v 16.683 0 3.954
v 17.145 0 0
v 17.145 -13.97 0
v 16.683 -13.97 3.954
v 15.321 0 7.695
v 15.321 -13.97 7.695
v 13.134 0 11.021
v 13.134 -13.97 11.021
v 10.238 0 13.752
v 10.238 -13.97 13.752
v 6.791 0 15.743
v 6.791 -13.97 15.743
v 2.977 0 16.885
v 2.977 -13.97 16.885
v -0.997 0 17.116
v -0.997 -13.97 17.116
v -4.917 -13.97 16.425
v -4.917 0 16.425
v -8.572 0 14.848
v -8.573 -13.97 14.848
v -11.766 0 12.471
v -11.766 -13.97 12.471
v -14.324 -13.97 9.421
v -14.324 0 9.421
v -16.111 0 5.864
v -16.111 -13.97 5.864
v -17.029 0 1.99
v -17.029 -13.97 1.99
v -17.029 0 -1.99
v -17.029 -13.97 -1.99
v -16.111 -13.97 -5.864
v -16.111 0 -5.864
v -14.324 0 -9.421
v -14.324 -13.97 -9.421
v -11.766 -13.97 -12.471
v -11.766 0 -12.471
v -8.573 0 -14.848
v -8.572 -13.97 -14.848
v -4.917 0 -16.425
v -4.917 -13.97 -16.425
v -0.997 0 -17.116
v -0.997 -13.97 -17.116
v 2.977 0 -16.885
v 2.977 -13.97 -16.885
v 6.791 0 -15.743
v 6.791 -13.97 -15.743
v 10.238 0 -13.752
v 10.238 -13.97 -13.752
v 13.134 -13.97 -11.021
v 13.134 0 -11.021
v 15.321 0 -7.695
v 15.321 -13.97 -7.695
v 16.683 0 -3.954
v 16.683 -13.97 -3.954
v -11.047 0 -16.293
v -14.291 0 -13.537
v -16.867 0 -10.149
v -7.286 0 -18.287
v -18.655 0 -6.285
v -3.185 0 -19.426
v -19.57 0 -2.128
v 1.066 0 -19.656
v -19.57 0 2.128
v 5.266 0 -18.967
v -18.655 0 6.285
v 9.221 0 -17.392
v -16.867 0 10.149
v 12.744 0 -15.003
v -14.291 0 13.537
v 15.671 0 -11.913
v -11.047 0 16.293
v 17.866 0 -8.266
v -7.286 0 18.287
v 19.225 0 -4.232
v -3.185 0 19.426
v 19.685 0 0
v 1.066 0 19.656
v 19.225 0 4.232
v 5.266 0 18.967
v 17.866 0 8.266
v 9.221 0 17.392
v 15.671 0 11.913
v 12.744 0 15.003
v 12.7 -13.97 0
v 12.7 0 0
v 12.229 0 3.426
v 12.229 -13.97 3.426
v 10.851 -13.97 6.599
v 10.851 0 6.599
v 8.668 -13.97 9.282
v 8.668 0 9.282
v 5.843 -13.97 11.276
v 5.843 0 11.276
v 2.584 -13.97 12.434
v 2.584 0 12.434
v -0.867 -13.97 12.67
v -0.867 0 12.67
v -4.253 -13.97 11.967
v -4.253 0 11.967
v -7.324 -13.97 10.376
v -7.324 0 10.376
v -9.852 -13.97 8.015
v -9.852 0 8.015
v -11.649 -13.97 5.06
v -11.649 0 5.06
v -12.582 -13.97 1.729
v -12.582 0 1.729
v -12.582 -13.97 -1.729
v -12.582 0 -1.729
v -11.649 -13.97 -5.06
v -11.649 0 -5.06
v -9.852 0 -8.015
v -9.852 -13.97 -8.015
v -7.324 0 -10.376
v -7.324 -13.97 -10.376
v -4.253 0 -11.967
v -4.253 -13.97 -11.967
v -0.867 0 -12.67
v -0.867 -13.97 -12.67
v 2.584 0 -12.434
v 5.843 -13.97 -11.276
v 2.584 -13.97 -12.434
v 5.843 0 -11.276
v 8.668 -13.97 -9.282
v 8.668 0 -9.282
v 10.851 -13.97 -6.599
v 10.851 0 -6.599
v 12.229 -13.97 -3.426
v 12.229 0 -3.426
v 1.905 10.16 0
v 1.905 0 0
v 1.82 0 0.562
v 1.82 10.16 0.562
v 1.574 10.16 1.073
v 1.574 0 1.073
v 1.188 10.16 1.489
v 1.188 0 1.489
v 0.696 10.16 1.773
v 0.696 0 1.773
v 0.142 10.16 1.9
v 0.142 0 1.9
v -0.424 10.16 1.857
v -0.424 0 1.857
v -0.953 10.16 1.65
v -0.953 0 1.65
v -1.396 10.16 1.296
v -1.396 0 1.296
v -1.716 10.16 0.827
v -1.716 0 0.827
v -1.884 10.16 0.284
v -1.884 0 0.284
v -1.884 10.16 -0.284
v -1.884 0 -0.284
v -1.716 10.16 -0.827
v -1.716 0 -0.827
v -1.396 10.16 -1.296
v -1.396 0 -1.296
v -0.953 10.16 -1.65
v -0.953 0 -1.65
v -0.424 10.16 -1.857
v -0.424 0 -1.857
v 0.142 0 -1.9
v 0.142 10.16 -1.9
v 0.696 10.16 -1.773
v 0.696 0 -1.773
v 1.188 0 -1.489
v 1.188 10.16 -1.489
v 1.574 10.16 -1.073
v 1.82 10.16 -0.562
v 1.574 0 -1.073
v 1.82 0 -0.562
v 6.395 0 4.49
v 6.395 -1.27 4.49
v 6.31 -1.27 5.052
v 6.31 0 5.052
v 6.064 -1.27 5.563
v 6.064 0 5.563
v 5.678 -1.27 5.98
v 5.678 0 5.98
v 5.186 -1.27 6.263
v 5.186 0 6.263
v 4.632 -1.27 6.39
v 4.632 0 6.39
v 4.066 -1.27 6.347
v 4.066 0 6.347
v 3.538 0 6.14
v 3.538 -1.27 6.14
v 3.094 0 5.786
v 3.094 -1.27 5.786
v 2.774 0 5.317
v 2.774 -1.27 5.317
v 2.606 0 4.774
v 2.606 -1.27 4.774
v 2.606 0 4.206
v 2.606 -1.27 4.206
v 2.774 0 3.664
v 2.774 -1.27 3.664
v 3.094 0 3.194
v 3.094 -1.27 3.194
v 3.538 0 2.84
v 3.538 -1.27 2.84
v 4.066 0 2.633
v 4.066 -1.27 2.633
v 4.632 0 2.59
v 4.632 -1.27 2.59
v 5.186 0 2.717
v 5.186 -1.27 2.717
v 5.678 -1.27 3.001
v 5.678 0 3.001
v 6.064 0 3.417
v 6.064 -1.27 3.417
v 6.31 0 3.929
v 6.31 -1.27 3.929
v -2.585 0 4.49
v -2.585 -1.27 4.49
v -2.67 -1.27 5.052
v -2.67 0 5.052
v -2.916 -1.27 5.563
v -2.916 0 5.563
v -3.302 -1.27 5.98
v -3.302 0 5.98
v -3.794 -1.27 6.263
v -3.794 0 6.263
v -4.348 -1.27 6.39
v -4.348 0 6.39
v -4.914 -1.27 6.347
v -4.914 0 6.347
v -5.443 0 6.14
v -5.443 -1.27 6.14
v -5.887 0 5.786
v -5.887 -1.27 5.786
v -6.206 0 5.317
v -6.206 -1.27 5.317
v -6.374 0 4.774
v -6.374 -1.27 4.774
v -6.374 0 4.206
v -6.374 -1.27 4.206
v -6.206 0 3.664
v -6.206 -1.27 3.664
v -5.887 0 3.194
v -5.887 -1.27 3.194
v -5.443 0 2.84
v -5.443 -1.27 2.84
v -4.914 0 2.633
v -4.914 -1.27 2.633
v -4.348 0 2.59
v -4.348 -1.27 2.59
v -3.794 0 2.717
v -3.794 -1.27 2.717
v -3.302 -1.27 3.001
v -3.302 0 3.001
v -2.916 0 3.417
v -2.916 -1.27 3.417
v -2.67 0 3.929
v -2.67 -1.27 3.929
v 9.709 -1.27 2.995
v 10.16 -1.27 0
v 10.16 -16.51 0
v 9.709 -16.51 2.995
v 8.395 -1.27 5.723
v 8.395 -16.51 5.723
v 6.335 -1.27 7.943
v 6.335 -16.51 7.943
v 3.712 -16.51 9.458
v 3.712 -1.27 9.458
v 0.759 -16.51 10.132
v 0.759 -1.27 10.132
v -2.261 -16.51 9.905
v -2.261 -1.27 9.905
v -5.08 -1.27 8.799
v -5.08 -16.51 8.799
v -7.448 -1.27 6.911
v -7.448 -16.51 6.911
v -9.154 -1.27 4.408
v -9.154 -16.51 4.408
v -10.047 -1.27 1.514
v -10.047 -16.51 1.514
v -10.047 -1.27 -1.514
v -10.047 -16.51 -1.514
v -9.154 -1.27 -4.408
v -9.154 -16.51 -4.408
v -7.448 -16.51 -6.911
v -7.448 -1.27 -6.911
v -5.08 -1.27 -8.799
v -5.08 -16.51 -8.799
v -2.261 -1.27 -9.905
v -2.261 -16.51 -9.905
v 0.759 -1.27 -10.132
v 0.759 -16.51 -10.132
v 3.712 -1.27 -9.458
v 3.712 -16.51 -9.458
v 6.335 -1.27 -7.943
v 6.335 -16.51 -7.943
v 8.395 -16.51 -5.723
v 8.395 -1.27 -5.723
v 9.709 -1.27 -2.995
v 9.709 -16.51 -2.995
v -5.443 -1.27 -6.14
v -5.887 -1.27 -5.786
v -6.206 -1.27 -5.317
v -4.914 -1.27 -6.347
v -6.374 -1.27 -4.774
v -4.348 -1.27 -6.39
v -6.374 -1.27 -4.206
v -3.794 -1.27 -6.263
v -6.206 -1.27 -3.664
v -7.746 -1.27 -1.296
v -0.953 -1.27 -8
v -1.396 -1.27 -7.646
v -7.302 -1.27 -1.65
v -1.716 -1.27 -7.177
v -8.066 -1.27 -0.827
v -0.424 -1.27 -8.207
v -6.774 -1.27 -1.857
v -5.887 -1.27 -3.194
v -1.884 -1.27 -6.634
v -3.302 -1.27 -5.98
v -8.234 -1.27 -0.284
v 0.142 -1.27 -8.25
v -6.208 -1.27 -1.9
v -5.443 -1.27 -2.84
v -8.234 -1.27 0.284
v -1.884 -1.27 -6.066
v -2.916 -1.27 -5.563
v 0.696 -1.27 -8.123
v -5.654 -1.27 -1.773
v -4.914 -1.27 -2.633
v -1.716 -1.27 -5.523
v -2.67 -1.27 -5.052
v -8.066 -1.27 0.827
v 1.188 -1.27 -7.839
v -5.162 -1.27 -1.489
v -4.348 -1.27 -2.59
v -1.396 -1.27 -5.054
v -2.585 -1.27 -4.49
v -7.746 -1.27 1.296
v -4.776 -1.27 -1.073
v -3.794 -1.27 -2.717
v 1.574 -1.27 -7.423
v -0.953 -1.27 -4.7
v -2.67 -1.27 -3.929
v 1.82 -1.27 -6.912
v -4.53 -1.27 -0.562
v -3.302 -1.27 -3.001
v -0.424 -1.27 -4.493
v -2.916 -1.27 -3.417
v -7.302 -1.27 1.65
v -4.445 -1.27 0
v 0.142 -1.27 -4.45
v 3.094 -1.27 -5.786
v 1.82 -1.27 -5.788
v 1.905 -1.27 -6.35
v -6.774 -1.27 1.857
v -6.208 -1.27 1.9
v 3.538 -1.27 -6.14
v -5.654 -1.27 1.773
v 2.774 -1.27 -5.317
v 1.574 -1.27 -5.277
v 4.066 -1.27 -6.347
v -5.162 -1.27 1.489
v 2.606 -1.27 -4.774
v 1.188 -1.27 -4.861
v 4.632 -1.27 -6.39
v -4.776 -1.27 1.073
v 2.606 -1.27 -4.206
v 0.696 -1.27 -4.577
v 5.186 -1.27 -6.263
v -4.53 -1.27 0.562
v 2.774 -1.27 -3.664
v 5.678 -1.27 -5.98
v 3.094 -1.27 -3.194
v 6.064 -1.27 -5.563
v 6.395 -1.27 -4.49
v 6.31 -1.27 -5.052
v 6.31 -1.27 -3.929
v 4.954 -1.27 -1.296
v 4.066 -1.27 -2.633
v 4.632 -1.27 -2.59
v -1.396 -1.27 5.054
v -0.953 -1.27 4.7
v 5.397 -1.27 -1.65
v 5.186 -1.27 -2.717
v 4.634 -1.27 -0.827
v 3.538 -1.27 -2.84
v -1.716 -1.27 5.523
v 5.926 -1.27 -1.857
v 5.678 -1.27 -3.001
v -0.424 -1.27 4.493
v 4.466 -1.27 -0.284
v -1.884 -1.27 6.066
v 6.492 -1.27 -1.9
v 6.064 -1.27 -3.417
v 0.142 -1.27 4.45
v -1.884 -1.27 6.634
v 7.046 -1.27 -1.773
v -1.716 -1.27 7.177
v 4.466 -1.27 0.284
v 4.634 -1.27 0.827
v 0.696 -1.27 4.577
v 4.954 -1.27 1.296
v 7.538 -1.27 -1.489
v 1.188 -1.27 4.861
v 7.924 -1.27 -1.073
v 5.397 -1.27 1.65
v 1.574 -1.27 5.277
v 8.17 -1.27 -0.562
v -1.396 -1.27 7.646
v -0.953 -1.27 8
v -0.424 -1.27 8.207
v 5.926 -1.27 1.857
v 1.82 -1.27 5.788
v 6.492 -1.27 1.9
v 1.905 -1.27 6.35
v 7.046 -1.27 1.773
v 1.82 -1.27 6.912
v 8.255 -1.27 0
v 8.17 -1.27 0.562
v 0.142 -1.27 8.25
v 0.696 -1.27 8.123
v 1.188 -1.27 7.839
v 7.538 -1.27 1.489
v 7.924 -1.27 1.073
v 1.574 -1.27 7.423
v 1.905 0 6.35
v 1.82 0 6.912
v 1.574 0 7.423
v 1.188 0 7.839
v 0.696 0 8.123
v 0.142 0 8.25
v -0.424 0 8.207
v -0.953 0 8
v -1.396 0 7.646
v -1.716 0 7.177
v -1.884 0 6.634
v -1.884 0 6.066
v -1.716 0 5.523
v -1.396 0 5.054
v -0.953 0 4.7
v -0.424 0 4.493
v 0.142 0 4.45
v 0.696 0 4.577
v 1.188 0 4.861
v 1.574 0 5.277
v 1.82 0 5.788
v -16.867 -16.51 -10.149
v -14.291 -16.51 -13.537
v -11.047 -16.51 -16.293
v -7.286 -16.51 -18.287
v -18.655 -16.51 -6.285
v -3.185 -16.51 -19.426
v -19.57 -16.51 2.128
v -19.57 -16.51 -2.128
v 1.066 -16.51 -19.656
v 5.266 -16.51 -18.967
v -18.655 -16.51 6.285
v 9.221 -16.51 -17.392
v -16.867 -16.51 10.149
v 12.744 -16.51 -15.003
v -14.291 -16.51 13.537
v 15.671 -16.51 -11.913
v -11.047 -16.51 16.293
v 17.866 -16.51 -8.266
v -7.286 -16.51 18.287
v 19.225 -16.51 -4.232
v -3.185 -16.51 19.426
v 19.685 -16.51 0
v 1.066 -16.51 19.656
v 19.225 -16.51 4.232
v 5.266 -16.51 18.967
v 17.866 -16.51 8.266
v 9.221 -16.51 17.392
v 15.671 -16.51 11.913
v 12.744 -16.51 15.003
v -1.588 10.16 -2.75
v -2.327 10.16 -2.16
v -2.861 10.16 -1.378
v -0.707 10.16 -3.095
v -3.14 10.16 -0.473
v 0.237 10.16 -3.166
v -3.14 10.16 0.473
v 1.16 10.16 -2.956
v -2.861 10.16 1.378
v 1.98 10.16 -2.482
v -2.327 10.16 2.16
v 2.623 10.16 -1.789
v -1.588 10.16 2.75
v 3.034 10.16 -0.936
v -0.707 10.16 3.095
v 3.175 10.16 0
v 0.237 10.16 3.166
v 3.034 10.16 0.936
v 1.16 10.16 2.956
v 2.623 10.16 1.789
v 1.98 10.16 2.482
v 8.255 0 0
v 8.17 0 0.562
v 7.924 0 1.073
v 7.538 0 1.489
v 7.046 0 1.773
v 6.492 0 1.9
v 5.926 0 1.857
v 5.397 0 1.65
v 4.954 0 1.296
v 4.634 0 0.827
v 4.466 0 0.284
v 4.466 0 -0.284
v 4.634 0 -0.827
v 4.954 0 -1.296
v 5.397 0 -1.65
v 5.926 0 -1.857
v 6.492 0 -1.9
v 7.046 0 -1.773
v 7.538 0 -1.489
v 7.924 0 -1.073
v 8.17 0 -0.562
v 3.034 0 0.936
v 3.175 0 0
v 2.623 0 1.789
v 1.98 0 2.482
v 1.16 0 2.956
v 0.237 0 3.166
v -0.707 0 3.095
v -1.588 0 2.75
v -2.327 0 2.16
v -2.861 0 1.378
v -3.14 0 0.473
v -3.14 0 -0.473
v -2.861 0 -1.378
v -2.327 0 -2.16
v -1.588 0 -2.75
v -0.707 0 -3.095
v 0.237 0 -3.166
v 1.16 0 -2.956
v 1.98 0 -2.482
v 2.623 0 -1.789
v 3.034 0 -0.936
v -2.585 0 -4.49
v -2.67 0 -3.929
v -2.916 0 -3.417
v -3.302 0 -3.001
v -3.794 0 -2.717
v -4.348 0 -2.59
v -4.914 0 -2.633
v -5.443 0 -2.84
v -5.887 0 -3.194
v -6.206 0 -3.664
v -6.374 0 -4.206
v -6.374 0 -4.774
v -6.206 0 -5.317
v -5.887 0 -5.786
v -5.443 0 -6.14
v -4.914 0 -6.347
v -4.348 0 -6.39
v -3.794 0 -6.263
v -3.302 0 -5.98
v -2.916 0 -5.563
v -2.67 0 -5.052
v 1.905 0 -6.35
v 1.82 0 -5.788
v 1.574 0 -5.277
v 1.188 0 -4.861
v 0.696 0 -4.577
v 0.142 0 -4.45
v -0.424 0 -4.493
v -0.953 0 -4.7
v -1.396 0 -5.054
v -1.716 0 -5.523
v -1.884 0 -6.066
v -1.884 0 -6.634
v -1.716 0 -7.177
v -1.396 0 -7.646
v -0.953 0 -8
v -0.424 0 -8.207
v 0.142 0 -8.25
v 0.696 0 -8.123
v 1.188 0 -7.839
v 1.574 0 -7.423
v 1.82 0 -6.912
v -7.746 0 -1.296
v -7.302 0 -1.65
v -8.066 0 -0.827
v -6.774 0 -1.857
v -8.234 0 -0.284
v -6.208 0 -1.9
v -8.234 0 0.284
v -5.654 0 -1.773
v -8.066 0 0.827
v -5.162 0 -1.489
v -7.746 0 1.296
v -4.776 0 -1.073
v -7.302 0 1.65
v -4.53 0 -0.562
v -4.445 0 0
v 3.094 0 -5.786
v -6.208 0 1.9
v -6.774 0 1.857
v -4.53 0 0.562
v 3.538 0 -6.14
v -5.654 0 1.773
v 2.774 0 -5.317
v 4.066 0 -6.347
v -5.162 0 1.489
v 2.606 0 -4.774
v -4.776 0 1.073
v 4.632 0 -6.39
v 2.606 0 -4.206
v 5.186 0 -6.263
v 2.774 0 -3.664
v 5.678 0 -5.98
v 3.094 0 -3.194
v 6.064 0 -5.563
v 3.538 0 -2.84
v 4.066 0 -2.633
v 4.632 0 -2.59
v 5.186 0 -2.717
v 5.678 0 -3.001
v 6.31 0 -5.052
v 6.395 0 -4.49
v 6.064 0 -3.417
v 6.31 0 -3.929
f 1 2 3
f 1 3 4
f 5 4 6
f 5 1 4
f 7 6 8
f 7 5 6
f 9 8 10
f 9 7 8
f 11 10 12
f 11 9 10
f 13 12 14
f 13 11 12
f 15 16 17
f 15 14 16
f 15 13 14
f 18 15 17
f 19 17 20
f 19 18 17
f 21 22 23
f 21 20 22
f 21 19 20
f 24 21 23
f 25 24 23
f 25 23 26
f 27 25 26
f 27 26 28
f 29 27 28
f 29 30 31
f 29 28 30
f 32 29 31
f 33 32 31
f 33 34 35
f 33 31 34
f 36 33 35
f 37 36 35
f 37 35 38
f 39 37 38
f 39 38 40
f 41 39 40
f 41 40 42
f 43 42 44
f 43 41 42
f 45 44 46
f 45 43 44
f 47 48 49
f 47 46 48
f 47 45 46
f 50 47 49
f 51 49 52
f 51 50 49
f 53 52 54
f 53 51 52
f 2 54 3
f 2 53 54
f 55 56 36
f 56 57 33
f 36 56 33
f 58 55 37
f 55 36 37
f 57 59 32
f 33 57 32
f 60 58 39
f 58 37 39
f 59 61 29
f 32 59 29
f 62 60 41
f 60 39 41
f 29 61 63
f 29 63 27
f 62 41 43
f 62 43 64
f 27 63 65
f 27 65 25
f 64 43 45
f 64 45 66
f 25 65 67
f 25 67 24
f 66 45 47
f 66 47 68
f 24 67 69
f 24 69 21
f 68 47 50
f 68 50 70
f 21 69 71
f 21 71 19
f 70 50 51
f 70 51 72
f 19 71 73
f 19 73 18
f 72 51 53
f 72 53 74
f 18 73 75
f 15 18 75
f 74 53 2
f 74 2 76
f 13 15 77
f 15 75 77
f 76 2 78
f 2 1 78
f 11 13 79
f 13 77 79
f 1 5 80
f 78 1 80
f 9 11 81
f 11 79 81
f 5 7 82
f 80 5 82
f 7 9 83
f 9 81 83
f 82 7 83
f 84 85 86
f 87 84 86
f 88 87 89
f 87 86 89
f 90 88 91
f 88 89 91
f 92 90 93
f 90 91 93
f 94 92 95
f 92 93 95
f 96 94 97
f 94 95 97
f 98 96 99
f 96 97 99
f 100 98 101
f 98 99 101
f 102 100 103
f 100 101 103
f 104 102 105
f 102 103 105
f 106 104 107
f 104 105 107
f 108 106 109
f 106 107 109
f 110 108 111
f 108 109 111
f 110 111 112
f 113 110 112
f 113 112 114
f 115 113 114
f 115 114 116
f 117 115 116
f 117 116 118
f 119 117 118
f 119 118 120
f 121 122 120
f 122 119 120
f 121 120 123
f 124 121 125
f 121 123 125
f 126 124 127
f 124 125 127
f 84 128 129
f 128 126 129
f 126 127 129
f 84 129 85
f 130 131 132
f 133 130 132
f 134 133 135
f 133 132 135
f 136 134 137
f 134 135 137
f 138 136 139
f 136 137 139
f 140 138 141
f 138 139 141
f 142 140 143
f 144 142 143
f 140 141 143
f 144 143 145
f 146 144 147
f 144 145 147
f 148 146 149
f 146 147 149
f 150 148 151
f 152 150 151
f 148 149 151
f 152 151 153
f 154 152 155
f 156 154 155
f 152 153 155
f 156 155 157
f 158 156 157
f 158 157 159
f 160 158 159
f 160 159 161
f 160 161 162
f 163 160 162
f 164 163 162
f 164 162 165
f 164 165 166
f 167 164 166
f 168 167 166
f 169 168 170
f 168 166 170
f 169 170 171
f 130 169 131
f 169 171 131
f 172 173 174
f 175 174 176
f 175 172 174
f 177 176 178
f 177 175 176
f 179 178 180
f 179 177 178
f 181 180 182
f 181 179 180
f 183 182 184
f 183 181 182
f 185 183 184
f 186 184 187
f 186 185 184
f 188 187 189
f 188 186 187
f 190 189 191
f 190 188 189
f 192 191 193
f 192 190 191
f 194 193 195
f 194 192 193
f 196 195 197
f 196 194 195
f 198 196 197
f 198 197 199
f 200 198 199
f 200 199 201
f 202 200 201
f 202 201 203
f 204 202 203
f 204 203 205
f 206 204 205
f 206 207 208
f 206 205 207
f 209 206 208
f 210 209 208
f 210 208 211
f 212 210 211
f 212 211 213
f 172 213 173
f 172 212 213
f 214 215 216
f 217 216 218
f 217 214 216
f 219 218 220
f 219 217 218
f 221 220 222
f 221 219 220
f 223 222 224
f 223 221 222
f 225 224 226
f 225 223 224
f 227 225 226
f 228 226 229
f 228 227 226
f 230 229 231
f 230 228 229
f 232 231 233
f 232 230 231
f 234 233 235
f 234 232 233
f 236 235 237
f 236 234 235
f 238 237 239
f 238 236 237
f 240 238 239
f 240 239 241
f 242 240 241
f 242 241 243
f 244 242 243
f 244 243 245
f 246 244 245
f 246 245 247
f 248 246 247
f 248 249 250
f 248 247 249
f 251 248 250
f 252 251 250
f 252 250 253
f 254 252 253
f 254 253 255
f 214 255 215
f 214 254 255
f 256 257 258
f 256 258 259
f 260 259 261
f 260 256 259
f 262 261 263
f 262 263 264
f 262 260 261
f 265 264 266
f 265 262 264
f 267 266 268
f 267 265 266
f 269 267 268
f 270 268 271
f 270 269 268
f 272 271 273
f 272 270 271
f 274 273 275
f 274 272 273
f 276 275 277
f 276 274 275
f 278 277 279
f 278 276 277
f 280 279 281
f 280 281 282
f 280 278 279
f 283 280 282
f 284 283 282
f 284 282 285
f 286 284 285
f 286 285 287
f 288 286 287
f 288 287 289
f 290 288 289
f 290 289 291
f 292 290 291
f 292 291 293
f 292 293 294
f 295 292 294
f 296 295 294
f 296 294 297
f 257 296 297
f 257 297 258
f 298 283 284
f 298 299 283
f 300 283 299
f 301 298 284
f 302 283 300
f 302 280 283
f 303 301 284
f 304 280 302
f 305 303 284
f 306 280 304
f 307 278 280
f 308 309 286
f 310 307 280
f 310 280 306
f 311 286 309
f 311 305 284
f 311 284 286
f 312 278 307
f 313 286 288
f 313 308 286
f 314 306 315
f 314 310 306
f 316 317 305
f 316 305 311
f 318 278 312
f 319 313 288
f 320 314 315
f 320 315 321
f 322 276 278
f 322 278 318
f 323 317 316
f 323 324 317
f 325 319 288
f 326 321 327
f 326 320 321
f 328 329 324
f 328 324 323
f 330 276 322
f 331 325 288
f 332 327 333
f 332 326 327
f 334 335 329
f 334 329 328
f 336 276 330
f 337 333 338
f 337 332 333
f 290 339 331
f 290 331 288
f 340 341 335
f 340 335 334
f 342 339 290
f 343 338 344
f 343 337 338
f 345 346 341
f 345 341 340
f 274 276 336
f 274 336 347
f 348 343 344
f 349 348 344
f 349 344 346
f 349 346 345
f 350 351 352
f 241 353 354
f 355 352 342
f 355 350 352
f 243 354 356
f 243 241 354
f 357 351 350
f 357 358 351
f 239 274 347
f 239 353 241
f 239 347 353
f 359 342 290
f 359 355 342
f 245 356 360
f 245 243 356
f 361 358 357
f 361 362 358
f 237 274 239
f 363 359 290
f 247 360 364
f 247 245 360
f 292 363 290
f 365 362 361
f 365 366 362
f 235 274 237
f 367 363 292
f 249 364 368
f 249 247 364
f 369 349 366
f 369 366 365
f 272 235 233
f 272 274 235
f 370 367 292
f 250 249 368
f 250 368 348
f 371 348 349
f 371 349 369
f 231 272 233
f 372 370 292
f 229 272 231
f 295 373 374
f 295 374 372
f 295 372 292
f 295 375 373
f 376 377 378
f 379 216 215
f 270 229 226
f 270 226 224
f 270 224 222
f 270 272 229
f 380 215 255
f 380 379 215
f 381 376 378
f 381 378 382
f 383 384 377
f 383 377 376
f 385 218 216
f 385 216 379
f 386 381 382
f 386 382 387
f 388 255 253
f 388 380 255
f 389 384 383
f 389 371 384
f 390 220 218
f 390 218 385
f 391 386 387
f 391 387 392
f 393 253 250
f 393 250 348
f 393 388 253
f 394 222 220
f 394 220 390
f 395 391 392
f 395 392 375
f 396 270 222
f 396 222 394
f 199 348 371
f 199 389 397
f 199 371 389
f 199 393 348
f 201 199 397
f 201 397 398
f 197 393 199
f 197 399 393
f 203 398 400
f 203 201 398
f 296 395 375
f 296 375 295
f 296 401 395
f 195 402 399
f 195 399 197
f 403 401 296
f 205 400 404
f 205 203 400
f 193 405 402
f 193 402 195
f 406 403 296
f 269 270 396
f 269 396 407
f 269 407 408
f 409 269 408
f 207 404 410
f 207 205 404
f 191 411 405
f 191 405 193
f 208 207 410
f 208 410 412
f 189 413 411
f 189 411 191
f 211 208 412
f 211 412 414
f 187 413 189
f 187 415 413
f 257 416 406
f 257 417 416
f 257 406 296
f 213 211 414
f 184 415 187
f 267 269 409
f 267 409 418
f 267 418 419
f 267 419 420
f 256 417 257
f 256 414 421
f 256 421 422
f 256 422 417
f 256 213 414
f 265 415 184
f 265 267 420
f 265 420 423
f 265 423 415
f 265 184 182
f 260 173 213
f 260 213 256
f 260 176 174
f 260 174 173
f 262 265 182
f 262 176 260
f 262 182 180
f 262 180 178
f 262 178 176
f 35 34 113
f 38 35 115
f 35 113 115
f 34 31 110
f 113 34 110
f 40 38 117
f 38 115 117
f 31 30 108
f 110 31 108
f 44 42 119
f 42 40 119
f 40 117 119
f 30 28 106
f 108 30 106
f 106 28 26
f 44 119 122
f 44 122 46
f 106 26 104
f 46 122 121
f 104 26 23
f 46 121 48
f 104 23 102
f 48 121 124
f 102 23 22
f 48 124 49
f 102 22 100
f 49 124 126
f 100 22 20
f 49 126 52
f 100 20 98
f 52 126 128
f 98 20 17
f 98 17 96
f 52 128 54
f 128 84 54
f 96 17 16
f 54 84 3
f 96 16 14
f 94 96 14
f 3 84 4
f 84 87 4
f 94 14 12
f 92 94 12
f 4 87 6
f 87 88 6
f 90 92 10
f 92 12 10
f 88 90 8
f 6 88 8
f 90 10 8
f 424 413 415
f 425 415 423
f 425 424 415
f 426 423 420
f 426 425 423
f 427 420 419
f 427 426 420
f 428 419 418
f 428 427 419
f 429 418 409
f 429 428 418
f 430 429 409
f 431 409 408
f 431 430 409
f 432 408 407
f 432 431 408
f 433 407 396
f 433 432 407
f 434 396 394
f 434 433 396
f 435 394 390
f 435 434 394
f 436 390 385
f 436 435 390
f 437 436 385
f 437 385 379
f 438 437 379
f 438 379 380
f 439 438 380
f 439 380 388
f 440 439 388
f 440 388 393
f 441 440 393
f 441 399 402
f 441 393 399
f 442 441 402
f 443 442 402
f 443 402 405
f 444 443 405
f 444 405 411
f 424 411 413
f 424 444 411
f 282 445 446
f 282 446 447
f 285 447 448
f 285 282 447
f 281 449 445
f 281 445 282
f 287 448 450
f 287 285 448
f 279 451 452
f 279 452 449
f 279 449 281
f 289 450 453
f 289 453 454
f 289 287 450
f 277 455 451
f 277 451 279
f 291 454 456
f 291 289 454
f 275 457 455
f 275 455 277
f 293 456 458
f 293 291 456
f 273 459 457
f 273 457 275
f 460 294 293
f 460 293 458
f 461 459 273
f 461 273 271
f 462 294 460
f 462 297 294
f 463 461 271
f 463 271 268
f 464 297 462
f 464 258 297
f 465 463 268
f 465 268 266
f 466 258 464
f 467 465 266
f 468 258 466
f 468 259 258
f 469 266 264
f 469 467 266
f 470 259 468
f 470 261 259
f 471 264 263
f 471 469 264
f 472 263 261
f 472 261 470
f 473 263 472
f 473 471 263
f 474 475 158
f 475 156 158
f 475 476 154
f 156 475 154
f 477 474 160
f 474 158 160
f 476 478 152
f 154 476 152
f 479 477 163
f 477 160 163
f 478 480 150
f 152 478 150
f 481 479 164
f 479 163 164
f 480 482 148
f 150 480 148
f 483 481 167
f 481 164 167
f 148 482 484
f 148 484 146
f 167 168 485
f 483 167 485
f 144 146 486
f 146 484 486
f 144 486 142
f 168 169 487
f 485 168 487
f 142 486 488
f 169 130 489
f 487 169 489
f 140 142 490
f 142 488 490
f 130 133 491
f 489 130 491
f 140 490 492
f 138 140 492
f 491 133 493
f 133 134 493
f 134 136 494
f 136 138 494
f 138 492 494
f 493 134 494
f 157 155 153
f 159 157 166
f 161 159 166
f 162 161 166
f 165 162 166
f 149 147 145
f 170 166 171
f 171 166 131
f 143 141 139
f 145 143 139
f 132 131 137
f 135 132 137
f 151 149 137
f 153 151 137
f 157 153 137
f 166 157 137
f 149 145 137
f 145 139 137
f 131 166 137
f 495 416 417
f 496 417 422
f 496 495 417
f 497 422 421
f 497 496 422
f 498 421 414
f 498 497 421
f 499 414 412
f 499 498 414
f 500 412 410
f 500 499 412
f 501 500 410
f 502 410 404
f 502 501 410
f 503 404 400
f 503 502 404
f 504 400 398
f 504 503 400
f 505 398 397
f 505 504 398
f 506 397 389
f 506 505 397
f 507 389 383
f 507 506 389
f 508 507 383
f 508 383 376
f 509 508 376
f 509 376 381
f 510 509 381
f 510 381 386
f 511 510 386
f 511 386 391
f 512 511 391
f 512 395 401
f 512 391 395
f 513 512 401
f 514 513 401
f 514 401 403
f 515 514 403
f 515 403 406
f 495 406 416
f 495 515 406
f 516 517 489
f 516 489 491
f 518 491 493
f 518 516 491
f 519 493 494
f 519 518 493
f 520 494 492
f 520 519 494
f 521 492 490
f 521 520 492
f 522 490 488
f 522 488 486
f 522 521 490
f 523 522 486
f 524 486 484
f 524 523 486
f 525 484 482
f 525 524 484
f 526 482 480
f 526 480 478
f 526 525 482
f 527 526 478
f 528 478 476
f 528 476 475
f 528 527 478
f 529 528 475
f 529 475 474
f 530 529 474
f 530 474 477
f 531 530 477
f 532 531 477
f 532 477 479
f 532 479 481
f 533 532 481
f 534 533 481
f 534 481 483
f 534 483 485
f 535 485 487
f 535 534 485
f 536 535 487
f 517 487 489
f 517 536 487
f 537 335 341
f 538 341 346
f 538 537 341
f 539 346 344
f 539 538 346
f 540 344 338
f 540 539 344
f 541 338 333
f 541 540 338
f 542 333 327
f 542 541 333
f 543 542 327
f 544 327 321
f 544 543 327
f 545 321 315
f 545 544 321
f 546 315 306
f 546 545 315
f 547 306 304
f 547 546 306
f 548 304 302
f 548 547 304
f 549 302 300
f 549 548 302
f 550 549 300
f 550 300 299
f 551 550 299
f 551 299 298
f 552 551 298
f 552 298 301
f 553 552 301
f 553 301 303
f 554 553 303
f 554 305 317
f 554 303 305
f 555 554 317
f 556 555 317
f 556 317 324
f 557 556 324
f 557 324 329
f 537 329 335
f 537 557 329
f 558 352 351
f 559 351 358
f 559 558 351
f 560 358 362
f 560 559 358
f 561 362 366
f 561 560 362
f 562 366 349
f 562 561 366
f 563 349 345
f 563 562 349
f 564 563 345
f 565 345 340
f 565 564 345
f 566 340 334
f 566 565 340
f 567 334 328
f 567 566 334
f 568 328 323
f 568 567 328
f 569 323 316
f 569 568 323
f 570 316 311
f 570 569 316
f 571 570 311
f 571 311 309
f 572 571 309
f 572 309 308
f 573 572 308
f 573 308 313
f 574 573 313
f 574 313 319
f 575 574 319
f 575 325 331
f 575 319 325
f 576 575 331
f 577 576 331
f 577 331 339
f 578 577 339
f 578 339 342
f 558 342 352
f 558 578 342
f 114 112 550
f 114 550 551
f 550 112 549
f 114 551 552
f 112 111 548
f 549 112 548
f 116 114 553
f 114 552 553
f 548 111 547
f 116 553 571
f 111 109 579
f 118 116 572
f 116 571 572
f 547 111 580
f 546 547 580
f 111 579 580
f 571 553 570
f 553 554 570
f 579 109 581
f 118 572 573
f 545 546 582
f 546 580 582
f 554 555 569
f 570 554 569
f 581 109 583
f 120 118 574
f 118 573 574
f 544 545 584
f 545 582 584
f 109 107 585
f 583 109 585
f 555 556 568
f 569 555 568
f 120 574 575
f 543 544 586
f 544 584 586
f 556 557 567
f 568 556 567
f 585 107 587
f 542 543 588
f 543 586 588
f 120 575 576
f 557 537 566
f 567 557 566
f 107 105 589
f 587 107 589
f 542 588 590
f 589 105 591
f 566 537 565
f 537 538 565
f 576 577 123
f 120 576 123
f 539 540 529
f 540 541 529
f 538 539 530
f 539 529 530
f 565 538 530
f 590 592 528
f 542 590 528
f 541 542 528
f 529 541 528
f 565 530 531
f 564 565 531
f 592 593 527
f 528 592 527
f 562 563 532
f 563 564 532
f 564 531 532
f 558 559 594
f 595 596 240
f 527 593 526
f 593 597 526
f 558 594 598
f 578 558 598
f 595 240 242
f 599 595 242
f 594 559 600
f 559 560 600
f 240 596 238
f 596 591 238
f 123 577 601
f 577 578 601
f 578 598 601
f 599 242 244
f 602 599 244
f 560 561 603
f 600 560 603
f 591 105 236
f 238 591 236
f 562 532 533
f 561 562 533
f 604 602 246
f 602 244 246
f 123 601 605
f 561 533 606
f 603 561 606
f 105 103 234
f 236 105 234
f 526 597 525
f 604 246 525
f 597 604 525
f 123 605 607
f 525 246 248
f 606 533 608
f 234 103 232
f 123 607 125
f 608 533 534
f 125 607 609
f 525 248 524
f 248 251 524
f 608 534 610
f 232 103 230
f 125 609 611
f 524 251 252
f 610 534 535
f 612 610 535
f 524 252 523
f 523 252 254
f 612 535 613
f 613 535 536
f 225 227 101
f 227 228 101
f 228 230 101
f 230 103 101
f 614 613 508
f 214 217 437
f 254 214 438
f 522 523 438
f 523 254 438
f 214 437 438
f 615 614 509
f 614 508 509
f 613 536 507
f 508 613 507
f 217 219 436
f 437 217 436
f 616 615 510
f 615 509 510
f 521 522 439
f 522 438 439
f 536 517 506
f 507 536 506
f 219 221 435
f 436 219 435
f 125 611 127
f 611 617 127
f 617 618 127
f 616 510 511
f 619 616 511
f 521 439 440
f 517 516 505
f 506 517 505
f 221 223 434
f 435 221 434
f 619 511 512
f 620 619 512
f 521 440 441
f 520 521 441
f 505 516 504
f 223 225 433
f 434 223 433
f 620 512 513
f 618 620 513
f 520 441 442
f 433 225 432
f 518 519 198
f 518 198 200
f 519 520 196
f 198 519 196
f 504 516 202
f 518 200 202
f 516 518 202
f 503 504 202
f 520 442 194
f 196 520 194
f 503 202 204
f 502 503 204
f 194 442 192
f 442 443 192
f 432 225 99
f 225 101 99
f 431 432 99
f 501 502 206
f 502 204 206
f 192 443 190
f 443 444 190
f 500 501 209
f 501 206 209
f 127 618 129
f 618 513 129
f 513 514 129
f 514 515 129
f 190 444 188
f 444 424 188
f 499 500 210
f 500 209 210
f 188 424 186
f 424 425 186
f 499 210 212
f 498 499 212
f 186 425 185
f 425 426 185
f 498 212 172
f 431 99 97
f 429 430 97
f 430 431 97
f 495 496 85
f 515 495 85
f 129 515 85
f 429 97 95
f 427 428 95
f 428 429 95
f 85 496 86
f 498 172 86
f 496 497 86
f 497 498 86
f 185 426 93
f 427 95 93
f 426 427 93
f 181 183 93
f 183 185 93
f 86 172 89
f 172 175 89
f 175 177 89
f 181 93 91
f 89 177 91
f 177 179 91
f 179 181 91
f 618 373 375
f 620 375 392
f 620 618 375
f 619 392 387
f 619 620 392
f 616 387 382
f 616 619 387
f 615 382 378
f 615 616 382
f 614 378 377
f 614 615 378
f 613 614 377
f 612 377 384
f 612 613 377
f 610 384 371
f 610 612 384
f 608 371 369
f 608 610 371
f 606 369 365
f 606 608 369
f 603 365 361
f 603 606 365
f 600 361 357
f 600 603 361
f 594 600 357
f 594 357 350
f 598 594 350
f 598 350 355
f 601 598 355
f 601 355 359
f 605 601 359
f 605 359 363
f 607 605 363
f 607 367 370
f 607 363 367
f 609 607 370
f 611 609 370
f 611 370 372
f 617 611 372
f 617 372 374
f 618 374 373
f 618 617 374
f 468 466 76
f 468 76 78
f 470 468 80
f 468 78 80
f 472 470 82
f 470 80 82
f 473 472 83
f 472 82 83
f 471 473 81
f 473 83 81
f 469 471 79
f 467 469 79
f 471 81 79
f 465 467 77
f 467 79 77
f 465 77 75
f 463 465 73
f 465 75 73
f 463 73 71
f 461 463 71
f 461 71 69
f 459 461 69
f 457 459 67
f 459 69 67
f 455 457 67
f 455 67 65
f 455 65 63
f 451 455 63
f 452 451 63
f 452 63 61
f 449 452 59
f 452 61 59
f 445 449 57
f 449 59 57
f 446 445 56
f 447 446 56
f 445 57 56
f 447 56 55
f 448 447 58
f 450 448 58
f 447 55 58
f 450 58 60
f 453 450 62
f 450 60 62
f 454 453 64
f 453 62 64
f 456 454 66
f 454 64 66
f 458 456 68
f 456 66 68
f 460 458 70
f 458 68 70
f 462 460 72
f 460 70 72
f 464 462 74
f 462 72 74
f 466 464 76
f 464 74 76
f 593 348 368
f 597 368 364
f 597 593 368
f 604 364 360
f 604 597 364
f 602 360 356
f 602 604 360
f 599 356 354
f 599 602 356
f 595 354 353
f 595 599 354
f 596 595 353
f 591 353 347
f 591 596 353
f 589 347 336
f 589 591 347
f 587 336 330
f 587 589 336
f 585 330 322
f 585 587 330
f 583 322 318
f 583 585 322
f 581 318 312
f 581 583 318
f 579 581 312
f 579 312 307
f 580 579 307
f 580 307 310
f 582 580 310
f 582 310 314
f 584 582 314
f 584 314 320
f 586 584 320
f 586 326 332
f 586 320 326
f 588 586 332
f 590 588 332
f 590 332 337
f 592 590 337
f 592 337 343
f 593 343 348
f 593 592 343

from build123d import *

# Parameters (mm, degrees)
F0_R     = 19.685
F0_R_2   = 10.16
F1_DEPTH = 16.51
F3_T     = -2.54
F2_R     = 10.16
F4_DEPTH = 1.27
F0_R_3   = 1.905
F5_DEPTH = 25.4
F0_R_4   = 3.175
F6_DEPTH = 10.16


with BuildPart() as f1:
    # F0 (on Front) → F1 (new body)
    with BuildSketch(Plane.XZ):
        Circle(F0_R)
        Circle(F0_R_2, mode=Mode.SUBTRACT)
    extrude(amount=F1_DEPTH)

    # F3
    f3_openings = [f1.faces().sort_by_distance(p)[0] for p in [
        (-19.128224, 0, 0),
    ]]
    offset(amount=F3_T, openings=f3_openings)

    # F2 (on face) → F4 (join)
    with BuildSketch(Plane.XZ):
        Circle(F2_R)
    extrude(amount=F4_DEPTH)

    # F0 (on Front) → F5 (cut)
    with BuildSketch(Plane.XZ):
        with Locations((4.490128, 4.490128)):
            Circle(F0_R_3)
        with Locations((6.35, 0)):
            Circle(F0_R_3)
        with Locations((4.490128, -4.490128)):
            Circle(F0_R_3)
        with Locations((0, -6.35)):
            Circle(F0_R_3)
        with Locations((-4.490128, -4.490128)):
            Circle(F0_R_3)
        with Locations((-6.35, 0)):
            Circle(F0_R_3)
        with Locations((-4.490128, 4.490128)):
            Circle(F0_R_3)
        with Locations((0, 6.35)):
            Circle(F0_R_3)
    extrude(amount=F5_DEPTH, mode=Mode.SUBTRACT)

    # F0 (on Front) → F6 (join)
    with BuildSketch(Plane.XZ):
        Circle(F0_R_4)
        Circle(F0_R_3, mode=Mode.SUBTRACT)
    extrude(amount=-F6_DEPTH)


solid = f1.part
